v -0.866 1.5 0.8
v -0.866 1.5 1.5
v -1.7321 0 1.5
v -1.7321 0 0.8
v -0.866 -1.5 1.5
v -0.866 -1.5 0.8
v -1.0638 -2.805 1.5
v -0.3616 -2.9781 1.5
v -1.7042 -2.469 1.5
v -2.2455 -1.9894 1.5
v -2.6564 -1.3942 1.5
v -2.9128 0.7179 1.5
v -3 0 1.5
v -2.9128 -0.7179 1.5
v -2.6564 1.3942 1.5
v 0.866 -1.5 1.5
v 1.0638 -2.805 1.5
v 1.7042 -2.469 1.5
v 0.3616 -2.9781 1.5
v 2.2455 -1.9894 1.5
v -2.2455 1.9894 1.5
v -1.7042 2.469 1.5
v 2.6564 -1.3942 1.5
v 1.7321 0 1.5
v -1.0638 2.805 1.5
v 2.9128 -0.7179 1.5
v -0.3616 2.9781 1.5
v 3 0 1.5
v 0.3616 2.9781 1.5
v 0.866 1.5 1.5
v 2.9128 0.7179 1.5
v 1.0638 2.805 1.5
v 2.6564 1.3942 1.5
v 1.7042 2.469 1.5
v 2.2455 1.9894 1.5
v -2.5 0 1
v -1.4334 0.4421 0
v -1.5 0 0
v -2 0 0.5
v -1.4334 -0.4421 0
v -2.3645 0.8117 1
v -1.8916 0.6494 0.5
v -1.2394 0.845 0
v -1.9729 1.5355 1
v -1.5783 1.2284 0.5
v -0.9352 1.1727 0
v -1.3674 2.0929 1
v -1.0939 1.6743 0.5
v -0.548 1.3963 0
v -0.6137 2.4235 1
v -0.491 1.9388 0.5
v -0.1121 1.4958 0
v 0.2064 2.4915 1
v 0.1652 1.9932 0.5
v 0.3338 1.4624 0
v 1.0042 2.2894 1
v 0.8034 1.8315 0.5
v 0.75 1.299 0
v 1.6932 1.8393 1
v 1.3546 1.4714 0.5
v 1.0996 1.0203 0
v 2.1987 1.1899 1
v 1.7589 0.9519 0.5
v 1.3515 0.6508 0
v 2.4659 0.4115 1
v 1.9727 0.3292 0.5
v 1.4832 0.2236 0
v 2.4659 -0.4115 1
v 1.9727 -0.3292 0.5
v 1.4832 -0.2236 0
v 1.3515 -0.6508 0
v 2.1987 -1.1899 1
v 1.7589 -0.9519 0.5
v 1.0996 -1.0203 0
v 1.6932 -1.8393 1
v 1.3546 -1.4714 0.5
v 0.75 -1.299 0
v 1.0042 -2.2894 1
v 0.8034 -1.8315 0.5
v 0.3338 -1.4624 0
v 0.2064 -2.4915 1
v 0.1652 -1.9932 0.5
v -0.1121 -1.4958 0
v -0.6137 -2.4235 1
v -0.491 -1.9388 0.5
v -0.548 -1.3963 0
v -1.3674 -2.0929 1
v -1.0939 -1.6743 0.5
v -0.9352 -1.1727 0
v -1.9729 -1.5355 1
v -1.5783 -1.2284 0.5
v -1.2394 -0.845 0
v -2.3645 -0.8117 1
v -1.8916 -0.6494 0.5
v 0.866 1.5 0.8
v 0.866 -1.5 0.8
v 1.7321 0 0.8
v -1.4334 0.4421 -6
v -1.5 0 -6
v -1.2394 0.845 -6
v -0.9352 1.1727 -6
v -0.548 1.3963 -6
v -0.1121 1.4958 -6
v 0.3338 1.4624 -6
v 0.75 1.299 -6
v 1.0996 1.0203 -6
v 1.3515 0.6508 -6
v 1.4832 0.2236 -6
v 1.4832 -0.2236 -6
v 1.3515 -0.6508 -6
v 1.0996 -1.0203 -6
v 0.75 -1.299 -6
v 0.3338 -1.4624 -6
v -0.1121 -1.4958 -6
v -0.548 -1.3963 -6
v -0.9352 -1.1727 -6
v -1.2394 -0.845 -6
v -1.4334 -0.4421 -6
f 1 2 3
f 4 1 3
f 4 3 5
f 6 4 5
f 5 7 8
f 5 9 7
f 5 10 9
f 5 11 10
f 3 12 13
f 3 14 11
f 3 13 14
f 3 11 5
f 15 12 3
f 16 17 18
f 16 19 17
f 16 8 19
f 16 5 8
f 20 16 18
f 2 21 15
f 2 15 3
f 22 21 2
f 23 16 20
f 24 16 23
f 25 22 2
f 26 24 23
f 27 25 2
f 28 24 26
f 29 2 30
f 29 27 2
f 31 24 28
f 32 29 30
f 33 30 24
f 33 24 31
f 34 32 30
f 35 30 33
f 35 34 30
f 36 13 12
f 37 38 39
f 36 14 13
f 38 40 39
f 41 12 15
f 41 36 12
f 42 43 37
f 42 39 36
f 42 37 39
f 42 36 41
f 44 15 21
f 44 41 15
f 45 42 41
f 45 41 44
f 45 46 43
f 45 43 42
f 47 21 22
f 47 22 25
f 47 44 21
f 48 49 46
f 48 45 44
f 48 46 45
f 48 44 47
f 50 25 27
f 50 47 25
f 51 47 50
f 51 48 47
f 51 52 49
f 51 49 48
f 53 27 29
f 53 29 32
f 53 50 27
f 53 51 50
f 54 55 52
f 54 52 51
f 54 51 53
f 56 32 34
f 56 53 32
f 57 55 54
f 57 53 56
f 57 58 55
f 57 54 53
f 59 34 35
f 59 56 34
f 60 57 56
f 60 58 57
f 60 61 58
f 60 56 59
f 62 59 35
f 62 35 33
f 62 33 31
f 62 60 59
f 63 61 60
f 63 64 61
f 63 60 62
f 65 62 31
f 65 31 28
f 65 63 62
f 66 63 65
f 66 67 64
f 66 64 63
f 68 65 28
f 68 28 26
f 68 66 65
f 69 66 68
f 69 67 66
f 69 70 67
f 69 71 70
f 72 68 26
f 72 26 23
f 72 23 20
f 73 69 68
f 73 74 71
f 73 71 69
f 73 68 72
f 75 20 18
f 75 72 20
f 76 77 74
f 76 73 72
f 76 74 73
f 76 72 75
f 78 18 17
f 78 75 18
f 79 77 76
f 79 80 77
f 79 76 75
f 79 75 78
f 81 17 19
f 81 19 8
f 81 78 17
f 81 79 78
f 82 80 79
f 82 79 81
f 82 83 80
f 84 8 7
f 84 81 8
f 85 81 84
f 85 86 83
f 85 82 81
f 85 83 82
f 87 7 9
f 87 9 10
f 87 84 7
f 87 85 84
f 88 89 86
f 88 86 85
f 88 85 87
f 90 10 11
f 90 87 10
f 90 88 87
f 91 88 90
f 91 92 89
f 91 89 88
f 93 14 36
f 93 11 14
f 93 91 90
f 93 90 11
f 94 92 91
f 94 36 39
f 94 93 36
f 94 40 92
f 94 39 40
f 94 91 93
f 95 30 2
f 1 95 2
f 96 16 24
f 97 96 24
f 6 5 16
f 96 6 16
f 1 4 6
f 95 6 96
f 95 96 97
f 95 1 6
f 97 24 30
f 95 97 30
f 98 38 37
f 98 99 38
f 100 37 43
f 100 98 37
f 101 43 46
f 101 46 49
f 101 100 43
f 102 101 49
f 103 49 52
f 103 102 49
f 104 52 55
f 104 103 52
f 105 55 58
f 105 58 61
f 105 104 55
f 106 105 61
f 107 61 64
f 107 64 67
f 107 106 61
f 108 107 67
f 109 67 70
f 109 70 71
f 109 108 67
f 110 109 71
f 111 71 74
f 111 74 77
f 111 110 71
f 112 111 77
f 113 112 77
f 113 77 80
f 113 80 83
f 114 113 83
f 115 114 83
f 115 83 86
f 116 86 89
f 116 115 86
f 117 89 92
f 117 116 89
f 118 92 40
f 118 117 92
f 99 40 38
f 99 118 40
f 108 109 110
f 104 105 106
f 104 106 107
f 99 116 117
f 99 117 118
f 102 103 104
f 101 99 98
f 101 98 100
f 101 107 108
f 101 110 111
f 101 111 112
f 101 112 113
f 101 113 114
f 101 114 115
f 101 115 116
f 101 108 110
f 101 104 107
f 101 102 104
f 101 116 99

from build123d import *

# Parameters (mm, degrees)
F3_DEPTH = 0.7


with BuildPart() as f1:
    # F0 (on Front) → F1 (revolve)
    with BuildSketch(Plane.XZ):
        Polygon((-1.5, 0), (-1.5, -6), (0, -6), (0, 1.5), (-3, 1.5), align=None)
    revolve(axis=Axis((0, 0, -4.202494), (0, 0, -1)))

    # F2 (on face) → F3 (cut)
    with BuildSketch(Plane.XY.offset(1.5)):
        Polygon((-0.866025, -1.5), (0.866025, -1.5), (1.732051, 0), (0.866025, 1.5), (-0.866025, 1.5), (-1.732051, 0), align=None)
    extrude(amount=-F3_DEPTH, mode=Mode.SUBTRACT)


solid = f1.part
